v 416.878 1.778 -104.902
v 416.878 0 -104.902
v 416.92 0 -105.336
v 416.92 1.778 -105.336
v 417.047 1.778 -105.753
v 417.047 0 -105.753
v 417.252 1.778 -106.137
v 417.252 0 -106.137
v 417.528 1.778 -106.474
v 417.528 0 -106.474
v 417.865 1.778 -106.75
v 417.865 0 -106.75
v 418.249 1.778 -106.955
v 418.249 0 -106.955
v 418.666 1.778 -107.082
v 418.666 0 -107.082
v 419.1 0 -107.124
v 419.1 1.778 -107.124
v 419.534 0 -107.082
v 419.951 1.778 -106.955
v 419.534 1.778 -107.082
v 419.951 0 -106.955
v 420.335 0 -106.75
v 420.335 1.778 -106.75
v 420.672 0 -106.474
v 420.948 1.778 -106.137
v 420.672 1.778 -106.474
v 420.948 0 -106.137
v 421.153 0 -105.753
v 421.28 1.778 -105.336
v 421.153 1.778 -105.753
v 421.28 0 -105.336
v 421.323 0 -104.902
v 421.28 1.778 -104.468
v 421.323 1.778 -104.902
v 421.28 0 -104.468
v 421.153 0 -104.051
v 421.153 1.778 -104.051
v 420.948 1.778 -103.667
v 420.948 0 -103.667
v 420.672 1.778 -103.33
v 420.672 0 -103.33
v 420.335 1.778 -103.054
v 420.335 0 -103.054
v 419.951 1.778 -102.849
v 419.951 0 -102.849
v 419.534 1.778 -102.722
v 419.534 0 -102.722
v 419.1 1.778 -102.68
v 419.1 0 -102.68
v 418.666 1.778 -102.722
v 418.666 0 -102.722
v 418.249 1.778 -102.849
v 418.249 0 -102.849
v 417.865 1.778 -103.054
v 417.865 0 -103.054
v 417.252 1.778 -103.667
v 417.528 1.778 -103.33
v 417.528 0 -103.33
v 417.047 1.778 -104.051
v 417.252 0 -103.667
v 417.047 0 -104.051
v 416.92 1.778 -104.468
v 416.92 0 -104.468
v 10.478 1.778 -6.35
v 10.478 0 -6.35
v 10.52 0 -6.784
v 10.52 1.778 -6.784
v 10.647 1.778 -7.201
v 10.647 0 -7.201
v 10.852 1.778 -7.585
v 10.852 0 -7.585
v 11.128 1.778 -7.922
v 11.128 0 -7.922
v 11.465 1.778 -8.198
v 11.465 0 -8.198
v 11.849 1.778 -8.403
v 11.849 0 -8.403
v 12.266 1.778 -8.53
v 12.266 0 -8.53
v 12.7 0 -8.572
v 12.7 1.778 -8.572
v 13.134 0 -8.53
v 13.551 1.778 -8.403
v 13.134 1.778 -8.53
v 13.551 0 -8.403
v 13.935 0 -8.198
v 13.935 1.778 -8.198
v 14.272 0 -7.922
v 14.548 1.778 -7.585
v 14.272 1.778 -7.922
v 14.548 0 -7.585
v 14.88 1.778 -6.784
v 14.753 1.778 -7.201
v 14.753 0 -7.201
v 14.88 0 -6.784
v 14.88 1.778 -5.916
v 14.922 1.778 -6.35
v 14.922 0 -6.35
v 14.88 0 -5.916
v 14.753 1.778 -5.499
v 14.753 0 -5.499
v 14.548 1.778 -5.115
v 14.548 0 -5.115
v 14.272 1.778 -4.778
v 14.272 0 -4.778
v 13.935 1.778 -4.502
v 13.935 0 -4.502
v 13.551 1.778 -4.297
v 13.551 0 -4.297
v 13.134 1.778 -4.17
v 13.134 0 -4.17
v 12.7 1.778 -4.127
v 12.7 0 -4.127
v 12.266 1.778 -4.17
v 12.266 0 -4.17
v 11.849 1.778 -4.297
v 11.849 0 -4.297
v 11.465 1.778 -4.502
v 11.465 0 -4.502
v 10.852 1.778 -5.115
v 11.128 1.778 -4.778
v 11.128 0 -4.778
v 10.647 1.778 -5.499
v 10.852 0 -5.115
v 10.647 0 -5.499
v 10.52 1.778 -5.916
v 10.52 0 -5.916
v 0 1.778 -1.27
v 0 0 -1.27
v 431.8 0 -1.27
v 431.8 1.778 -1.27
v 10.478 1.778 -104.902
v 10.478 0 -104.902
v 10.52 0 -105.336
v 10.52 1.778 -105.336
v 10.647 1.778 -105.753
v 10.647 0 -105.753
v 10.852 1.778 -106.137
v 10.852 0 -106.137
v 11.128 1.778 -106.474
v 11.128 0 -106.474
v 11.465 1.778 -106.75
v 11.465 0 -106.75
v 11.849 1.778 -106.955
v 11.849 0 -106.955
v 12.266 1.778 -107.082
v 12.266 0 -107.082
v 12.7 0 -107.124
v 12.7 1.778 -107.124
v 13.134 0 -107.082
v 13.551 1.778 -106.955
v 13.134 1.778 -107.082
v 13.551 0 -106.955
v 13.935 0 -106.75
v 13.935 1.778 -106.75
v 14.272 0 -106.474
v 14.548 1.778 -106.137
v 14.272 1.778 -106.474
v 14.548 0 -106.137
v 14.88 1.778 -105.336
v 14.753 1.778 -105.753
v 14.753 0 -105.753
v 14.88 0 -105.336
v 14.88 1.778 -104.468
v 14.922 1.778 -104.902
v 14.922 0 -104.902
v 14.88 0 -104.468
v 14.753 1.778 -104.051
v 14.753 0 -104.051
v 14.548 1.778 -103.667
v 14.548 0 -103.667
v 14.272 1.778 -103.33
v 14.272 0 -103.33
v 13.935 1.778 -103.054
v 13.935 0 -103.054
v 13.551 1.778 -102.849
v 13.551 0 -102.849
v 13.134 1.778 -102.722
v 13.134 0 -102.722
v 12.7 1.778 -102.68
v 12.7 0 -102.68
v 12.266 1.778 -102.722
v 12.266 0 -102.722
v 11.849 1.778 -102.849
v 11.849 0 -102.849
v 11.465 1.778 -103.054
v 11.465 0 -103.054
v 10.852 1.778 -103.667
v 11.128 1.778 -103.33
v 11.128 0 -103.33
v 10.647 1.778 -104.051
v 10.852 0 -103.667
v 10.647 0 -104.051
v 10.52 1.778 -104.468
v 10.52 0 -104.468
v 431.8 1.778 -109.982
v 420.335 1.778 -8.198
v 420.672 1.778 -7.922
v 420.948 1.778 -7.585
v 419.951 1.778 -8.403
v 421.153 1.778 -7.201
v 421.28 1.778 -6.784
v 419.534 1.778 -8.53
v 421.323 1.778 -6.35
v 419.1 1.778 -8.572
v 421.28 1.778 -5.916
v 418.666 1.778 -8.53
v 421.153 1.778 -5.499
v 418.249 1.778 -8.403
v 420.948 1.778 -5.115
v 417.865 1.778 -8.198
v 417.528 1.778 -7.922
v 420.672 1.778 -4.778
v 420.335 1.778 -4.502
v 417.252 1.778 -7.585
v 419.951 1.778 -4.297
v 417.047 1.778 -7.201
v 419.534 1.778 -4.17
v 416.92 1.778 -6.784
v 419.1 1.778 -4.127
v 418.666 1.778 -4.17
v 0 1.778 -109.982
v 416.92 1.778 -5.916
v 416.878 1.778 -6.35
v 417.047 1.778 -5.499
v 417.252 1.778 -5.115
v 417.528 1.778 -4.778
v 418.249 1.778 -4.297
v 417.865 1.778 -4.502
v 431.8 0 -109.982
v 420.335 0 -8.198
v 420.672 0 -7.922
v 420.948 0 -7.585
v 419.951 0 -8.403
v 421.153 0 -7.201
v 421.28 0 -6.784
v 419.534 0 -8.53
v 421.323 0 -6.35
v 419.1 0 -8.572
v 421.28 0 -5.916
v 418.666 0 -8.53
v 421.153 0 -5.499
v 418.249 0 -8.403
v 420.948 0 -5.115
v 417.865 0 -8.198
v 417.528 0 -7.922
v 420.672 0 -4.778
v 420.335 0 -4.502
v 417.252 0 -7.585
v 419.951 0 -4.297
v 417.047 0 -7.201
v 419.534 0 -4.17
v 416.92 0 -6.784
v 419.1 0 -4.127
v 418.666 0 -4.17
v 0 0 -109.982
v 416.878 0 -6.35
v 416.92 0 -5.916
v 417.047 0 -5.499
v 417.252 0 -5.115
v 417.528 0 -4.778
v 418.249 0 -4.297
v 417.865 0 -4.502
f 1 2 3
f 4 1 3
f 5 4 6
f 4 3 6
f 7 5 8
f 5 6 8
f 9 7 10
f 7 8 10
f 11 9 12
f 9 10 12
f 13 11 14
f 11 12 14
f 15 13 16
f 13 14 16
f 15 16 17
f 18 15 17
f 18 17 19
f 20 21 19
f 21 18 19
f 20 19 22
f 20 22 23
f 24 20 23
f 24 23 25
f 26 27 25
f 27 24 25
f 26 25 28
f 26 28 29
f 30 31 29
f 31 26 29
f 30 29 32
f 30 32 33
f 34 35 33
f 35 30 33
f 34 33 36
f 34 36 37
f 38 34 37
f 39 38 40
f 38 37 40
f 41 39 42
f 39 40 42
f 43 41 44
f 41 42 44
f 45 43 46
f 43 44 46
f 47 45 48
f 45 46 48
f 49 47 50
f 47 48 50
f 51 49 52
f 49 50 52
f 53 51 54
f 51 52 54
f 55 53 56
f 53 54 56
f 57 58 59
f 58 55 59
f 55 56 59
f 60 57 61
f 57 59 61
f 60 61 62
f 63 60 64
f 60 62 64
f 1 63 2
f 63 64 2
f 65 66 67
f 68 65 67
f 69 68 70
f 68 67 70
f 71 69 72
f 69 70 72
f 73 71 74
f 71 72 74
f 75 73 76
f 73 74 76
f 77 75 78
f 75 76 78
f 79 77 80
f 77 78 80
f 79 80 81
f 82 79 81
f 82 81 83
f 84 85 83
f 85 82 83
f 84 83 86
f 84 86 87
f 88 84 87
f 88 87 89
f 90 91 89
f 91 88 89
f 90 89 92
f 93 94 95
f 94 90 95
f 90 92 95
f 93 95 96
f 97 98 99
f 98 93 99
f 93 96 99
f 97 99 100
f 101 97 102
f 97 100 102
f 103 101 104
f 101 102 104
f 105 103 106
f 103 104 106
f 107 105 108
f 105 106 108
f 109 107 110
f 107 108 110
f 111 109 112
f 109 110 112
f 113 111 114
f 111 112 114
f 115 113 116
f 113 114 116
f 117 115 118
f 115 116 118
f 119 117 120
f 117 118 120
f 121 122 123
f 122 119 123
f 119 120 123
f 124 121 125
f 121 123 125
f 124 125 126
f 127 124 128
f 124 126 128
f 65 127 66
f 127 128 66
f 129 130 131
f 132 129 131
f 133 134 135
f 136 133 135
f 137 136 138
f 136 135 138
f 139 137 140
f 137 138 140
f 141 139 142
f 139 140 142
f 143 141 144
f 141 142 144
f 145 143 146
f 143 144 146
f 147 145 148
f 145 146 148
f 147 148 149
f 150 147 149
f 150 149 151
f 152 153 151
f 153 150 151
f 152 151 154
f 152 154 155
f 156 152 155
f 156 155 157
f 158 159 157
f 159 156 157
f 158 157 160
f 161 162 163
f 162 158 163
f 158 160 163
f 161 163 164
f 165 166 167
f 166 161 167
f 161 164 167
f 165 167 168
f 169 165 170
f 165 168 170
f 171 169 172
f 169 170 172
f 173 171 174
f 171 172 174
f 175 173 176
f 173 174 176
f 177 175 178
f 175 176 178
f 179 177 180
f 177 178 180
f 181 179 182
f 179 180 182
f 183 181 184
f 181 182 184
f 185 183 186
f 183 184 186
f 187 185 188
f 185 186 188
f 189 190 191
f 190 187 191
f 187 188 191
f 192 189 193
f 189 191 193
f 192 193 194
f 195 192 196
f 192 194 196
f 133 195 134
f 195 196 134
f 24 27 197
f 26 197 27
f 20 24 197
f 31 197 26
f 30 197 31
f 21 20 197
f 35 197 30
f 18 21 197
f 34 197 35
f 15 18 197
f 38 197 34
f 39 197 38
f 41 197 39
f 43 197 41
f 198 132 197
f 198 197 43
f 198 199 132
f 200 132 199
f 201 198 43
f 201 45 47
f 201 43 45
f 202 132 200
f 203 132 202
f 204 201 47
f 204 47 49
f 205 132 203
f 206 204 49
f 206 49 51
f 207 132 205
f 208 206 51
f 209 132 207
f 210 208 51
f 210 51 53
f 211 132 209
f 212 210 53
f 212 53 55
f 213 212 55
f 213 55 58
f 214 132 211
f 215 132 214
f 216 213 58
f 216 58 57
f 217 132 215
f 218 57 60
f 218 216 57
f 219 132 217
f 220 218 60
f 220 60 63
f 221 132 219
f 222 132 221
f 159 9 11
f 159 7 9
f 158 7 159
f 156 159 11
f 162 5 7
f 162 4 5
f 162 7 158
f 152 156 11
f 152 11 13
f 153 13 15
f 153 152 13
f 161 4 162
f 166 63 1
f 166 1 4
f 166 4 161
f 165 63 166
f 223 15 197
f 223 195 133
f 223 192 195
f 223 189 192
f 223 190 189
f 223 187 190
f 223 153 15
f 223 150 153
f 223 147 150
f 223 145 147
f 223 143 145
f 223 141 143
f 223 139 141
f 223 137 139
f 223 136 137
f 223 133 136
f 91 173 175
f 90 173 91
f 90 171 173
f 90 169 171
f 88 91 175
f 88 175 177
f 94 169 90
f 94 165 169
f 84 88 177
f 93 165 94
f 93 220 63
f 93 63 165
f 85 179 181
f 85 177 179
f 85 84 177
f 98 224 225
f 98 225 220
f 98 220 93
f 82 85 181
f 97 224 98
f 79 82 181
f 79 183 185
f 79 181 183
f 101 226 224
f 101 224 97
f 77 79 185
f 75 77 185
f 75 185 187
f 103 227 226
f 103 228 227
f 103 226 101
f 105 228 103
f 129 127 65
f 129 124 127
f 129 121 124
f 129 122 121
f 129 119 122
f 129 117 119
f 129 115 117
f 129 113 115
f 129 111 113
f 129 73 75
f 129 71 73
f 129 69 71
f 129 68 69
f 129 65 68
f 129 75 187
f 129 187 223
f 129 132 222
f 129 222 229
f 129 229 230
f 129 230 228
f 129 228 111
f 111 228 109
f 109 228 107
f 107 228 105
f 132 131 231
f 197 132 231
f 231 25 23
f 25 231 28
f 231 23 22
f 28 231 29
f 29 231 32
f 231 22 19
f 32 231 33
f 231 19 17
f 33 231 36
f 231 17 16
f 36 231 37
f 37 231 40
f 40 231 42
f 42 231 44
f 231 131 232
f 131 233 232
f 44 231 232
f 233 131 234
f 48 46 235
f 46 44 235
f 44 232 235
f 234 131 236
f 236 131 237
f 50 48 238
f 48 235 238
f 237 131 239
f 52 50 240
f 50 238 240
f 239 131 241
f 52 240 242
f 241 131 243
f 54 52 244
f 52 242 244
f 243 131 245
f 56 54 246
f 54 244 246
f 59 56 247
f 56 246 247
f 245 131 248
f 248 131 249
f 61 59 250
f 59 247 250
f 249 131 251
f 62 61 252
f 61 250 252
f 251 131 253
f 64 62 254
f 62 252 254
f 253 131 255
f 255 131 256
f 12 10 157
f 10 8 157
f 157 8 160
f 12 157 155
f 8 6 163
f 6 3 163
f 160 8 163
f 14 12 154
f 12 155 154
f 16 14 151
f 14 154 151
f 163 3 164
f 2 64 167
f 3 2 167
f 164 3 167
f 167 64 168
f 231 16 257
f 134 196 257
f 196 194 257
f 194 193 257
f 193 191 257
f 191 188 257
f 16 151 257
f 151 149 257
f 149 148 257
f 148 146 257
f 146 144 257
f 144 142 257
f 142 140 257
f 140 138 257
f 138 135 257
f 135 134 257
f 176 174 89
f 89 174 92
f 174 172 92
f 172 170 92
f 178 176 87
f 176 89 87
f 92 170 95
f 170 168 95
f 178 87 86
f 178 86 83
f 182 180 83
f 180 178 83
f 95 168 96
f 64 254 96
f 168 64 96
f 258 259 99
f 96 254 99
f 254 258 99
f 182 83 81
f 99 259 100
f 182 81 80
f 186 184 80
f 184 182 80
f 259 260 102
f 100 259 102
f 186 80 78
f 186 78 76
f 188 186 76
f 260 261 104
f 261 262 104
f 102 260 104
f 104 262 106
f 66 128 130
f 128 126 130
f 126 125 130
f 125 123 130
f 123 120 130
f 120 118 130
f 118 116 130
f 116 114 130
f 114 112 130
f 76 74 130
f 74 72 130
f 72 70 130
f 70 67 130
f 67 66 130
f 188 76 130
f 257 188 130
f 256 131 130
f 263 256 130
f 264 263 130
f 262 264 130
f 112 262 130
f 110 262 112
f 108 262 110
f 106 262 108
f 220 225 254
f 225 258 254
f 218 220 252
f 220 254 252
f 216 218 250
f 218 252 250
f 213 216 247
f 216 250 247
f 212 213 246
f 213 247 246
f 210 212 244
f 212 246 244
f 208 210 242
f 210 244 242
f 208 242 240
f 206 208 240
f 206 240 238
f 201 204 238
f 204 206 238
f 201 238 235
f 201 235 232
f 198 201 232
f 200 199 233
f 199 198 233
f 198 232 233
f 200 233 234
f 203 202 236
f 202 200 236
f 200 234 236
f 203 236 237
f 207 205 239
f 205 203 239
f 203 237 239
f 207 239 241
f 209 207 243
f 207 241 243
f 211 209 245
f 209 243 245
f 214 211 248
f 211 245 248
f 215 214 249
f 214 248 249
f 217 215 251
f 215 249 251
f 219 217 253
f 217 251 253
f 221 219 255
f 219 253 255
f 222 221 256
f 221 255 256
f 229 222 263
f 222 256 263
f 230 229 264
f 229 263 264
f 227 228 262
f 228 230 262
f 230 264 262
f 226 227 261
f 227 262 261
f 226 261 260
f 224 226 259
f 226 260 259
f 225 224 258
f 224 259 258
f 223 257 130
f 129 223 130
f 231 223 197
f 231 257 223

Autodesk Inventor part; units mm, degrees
ref_plane "YZ Plane" through (0, 0, 0) normal (1, 0, 0) x (0, 1, 0)
ref_plane "XZ Plane" through (0, 0, 0) normal (0, 1, 0) x (-1, 0, 0)
ref_plane "XY Plane" through (0, 0, 0) normal (0, 0, 1) x (1, 0, 0)
sketch "Sketch1" plane through (0, 0, 0) normal (0, 1, 0) x (-1, 0, 0)
  line L0 (-431.8, -1.27) -> (-431.8, -109.982)
  line L1 (0, -109.982) -> (0, -1.27)
  circle A0 centre (-12.7, -6.35) radius 2.2225
  circle A1 centre (-12.7, -104.902) radius 2.2225
  circle A2 centre (-419.1, -6.35) radius 2.2225
  circle A3 centre (-419.1, -104.902) radius 2.2225
  line L2 (0, -109.982) -> (-431.8, -109.982)
  line L3 (0, -109.982) -> (431.8, -109.982) construction
  line L4 (0, -1.27) -> (-431.8, -1.27)
  point P0 (0, 0)
  dimension "d2" = 4.445
  dimension "d3" = 4.445
  dimension "d4" = 4.445
  dimension "d5" = 4.445
  dimension "d6" = 431.8
extrude "Extrusion1" add sketch "Sketch1" along normal blind 1.778
properties part number "conveyor_backing_final"
